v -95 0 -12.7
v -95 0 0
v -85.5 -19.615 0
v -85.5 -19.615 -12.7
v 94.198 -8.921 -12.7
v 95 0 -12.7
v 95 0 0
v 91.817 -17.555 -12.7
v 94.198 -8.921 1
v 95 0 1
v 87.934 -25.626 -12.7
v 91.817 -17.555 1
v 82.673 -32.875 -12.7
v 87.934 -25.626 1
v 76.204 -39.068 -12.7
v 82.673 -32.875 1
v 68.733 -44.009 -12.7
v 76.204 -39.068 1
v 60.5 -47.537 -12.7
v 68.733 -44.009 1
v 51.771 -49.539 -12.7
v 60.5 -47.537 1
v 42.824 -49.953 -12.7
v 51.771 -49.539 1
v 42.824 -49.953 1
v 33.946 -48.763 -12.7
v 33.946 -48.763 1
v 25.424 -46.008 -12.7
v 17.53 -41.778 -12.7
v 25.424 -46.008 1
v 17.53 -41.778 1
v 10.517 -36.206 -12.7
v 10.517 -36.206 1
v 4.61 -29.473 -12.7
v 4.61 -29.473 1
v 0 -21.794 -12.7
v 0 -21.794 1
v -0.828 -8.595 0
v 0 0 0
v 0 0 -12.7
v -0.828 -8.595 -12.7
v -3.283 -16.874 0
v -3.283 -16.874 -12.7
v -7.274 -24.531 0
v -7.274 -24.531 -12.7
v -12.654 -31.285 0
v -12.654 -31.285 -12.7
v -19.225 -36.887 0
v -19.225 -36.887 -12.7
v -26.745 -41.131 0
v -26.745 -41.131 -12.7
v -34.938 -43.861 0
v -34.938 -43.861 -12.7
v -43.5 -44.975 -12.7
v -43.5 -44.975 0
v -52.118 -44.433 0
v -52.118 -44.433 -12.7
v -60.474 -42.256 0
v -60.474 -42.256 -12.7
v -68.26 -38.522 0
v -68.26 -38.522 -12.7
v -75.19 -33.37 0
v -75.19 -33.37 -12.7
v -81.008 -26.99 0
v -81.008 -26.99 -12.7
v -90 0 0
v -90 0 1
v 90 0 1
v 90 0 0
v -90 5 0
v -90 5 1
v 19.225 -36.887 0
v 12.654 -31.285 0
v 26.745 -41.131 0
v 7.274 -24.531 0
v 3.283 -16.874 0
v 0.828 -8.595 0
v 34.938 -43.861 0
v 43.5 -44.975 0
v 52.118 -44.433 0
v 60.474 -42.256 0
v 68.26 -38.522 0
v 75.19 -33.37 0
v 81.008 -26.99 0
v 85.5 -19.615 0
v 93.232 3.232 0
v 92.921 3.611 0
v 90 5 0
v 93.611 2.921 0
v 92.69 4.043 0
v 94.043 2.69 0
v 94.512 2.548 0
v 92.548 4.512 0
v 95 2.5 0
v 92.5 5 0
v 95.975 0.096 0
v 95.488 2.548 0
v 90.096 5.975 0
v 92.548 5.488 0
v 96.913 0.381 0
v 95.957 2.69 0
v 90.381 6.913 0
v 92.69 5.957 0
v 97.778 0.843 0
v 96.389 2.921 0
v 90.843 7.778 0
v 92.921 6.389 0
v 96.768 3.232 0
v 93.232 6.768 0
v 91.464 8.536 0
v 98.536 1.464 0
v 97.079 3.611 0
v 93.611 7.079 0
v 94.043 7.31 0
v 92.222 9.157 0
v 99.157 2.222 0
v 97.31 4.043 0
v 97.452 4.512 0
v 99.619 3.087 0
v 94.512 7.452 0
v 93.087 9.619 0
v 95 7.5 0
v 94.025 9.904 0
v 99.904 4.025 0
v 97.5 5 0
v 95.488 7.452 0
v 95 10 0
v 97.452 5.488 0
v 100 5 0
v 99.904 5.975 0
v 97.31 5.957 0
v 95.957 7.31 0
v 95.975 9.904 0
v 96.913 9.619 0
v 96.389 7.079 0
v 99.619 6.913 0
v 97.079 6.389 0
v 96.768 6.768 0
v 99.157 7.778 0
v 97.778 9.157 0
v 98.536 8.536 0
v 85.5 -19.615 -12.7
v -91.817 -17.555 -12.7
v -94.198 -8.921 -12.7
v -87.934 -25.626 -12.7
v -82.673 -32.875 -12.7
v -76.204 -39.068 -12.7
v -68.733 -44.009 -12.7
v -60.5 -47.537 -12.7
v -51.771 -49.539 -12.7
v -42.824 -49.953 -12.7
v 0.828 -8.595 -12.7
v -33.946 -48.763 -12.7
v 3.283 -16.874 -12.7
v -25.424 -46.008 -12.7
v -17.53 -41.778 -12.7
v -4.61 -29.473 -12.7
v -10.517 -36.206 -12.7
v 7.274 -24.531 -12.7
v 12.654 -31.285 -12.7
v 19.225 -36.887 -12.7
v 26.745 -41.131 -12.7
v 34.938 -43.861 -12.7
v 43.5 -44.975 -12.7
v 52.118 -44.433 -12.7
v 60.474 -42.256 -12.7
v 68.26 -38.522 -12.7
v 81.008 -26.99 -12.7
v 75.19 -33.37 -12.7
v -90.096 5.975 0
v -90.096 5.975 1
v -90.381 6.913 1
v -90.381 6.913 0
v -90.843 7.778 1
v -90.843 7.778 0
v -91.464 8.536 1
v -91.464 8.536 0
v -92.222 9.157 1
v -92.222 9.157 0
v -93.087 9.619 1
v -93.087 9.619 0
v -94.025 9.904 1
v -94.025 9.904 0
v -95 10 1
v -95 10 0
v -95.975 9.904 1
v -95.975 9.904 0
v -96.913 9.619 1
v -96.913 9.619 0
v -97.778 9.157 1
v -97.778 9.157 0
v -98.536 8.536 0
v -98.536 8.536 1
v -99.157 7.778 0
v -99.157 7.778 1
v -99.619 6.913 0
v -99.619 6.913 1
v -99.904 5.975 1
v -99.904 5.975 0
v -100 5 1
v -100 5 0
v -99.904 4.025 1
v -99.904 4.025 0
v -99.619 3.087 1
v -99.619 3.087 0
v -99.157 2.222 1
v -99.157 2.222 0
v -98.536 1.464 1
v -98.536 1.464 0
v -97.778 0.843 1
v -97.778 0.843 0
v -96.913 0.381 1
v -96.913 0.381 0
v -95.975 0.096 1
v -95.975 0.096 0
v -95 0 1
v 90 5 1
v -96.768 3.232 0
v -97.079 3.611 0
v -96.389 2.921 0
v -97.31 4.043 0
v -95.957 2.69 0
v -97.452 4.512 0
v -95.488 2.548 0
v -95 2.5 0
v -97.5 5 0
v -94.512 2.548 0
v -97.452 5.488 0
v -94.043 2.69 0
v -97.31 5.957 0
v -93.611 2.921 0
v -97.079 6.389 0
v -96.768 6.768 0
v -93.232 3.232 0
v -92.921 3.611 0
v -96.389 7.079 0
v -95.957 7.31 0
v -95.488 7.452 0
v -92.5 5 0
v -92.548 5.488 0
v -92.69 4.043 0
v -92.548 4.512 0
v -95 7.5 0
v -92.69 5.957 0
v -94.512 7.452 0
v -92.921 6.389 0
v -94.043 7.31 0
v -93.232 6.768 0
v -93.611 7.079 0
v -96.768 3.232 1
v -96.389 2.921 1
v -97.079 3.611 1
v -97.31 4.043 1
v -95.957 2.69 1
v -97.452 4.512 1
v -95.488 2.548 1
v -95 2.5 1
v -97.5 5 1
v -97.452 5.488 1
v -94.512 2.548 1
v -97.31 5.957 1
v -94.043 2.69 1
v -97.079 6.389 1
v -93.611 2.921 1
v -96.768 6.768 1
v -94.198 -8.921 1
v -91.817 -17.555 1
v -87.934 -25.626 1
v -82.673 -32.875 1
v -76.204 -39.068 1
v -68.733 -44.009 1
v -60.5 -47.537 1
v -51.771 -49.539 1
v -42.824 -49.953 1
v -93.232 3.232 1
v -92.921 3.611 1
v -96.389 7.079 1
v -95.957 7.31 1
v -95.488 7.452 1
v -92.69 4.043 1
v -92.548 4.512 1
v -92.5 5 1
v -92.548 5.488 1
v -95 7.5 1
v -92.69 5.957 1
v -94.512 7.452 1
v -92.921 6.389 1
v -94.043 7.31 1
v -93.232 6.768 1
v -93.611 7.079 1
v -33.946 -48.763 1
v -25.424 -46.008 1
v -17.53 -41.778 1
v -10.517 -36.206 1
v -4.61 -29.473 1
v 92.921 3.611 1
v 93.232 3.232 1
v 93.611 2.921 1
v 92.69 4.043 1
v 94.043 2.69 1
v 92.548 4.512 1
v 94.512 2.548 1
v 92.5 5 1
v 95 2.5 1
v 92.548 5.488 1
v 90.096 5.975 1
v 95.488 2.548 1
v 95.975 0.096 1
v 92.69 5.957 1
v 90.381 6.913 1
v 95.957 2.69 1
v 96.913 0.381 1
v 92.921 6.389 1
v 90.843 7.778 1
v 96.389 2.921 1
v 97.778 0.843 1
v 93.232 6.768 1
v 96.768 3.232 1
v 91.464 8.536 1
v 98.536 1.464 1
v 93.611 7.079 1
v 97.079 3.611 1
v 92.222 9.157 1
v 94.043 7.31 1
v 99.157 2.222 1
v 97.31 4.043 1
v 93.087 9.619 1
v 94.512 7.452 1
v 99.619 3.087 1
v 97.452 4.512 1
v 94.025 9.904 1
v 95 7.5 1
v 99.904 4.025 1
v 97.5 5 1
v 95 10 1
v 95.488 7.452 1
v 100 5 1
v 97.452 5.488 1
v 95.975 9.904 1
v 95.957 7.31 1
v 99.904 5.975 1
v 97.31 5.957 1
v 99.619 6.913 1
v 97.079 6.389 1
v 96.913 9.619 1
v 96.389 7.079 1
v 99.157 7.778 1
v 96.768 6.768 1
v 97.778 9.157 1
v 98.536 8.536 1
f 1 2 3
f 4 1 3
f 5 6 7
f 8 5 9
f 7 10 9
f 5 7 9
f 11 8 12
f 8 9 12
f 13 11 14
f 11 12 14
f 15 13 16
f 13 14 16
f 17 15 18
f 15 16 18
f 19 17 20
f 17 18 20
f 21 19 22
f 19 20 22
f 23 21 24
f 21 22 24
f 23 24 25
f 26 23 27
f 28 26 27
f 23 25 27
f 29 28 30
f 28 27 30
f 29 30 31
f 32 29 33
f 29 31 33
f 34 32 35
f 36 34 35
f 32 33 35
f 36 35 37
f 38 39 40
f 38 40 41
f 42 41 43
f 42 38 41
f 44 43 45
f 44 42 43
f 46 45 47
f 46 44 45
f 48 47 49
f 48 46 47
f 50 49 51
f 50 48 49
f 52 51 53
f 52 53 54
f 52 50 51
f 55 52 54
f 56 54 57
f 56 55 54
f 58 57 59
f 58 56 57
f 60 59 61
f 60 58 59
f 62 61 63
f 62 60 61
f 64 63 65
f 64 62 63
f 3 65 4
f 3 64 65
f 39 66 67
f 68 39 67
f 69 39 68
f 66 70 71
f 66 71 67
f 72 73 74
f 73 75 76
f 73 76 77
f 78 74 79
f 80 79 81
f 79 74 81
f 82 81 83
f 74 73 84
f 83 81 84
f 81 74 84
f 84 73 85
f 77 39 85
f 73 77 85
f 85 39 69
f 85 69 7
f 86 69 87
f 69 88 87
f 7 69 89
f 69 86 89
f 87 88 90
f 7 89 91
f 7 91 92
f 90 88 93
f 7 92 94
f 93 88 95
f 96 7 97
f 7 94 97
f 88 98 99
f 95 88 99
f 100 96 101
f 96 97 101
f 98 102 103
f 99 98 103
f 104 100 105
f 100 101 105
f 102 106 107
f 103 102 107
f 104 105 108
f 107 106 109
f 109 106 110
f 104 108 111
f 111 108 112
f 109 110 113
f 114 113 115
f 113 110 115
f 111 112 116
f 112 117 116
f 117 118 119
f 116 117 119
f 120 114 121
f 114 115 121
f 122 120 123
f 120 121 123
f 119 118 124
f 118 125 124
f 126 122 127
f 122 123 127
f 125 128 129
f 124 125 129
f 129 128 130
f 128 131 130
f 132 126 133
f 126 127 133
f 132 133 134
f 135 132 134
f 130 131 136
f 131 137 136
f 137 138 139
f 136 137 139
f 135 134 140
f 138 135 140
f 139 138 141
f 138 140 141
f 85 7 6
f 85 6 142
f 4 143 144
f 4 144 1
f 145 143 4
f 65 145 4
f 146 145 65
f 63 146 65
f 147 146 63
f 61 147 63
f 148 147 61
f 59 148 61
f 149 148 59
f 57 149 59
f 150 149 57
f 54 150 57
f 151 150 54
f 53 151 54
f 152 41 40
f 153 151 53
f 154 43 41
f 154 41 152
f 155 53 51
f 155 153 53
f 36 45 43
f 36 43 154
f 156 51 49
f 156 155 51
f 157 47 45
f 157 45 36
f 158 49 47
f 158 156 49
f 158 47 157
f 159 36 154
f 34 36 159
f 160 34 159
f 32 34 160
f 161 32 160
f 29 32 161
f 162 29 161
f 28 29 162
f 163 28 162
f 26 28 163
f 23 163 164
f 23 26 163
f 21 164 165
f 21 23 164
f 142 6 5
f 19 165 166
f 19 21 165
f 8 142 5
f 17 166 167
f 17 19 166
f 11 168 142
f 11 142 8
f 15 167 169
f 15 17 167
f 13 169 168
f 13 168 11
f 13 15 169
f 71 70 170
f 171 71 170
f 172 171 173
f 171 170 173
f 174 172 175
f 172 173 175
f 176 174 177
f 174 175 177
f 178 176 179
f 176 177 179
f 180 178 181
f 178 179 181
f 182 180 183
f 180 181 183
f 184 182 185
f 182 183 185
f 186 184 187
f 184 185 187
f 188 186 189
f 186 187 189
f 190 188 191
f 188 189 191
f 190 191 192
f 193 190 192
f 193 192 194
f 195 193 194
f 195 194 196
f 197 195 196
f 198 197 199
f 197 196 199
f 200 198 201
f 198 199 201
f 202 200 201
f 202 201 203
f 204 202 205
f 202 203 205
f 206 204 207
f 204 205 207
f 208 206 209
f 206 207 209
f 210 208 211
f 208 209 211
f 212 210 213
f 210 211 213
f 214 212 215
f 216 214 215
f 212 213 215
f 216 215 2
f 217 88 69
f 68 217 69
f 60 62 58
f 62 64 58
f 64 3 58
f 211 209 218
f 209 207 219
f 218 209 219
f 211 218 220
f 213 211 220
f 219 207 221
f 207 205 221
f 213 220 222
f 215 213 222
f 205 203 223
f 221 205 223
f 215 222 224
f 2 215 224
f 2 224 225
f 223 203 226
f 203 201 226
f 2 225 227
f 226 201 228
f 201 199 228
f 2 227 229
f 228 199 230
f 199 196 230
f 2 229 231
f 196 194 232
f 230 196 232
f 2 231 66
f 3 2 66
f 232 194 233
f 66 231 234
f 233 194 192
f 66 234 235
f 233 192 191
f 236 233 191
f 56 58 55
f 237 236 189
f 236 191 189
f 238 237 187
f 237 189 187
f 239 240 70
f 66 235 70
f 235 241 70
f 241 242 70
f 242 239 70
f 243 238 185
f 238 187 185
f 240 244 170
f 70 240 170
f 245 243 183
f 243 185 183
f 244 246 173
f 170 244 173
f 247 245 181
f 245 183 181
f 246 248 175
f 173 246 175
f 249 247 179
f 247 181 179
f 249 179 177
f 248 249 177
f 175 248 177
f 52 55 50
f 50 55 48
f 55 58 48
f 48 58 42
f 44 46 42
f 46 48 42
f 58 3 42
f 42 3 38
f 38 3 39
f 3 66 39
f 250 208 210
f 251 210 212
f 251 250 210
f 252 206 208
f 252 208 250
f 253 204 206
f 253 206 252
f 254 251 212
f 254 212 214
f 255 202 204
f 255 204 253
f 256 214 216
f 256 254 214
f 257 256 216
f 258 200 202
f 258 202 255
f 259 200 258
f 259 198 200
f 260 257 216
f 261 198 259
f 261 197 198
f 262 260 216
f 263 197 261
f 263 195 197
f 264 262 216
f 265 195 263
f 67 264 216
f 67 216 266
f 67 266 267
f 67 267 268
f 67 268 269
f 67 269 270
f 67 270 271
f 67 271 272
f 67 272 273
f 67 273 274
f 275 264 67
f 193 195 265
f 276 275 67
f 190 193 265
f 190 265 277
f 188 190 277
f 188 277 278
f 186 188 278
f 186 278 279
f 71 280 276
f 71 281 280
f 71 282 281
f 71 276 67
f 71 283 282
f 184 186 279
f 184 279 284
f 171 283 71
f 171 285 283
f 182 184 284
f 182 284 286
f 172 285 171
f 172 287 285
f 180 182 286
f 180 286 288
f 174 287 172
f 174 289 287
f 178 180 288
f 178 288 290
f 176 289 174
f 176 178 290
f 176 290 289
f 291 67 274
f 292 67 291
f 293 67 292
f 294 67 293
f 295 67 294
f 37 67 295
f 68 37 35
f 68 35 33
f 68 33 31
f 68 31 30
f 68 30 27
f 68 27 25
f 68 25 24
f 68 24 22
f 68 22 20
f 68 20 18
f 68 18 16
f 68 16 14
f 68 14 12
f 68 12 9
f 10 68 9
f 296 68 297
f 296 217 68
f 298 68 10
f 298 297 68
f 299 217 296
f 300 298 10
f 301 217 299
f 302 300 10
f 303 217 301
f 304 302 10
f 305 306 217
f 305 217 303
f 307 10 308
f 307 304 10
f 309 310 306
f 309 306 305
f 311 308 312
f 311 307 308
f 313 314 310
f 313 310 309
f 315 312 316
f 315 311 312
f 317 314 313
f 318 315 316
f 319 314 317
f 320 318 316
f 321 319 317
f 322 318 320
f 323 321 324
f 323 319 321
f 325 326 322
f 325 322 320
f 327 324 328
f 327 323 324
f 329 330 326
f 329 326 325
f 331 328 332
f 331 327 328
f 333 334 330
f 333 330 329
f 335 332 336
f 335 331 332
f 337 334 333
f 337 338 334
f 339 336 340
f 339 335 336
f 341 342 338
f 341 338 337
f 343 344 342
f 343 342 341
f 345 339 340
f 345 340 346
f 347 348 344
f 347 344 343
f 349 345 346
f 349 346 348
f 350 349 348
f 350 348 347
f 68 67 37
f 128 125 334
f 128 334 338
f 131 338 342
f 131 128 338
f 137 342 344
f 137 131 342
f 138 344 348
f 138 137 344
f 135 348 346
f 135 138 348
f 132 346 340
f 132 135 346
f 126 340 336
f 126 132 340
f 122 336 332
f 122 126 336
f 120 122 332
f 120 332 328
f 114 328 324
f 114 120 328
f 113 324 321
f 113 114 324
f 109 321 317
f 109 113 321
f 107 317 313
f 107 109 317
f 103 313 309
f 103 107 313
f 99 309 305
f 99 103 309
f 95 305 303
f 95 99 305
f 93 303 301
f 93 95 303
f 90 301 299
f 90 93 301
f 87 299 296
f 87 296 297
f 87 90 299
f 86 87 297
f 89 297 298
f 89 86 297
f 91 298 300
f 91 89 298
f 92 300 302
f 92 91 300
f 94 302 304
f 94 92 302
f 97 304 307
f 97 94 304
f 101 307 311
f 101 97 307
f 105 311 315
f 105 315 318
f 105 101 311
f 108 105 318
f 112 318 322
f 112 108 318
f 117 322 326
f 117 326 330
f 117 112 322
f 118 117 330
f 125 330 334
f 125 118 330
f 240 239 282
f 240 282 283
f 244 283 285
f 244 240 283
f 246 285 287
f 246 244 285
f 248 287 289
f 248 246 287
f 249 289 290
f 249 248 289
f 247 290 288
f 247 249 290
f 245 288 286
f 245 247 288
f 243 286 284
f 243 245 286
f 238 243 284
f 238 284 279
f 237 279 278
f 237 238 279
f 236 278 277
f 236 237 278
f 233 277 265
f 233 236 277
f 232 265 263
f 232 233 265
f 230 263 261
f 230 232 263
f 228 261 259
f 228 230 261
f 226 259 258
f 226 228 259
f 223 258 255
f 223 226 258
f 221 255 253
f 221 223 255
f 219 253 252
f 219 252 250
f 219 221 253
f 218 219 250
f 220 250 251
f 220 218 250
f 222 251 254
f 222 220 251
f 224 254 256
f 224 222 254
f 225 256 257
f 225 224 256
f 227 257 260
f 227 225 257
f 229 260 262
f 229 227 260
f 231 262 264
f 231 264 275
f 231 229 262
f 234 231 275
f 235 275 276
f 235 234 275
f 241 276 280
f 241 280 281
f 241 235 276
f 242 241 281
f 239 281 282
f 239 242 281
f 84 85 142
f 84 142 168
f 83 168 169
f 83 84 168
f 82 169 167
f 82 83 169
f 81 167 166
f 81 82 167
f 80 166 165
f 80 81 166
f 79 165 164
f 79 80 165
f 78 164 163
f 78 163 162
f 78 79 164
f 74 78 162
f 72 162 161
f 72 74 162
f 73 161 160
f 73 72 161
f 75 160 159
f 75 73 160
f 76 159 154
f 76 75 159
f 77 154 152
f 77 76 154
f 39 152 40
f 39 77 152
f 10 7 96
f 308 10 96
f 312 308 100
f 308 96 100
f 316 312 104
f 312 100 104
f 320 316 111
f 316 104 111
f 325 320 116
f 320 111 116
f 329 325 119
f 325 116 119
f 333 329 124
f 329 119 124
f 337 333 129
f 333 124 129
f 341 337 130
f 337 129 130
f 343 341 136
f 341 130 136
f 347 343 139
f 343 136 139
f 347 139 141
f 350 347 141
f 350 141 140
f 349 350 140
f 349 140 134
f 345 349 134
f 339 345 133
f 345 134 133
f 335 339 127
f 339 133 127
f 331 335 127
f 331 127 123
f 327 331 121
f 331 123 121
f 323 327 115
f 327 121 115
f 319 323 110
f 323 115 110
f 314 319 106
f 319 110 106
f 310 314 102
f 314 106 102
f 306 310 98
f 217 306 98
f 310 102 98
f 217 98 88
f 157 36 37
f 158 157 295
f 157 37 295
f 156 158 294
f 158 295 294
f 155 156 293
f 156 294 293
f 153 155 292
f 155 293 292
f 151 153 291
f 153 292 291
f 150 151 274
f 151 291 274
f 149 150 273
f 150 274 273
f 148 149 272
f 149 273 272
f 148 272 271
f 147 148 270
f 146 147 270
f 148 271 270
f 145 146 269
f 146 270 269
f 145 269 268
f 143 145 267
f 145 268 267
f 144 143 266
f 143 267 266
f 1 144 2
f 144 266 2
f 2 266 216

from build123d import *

# Parameters (mm, degrees)
SKETCH_R     = 2.5
PAD_DEPTH    = 1
PAD001_DEPTH = 12.7


with BuildPart() as part:
    # Sketch → Pad (new body)
    with BuildSketch(Plane.XY):
        with BuildLine():
            ThreePointArc((0, -21.794495), (56.18034, -48.733972), (95, 0))
            ThreePointArc((95, 0), (98.535534, 8.535534), (90, 5))
            Line((90, 5), (90, 0))
            Line((-90, 0), (90, 0))
            Line((-90, 5), (-90, 0))
            ThreePointArc((-90, 5), (-98.535534, 8.535534), (-95, 0))
            ThreePointArc((-95, 0), (-56.18034, -48.733972), (0, -21.794495))
        make_face()
        with Locations((95, 5)):
            Circle(SKETCH_R, mode=Mode.SUBTRACT)
        with Locations((-95, 5)):
            Circle(SKETCH_R, mode=Mode.SUBTRACT)
    extrude(amount=PAD_DEPTH)

    # Sketch001 (on Face10 of Pad) → Pad001 (join)
    with BuildSketch(Plane(origin=(0, 0, 0), x_dir=(1, 0, 0), z_dir=(0, 0, -1))):
        with BuildLine():
            Line((-95, 0), (-85.5, 19.615045))
            ThreePointArc((0, 0), (-34.937694, 43.860575), (-85.5, 19.615045))
            ThreePointArc((85.5, 19.615045), (34.937694, 43.860575), (0, 0))
            Line((95, 0), (85.5, 19.615045))
            ThreePointArc((95, 0), (56.18034, 48.733972), (0, 21.794495))
            ThreePointArc((0, 21.794495), (-56.18034, 48.733972), (-95, 0))
        make_face()
    extrude(amount=PAD001_DEPTH)


solid = part.part
